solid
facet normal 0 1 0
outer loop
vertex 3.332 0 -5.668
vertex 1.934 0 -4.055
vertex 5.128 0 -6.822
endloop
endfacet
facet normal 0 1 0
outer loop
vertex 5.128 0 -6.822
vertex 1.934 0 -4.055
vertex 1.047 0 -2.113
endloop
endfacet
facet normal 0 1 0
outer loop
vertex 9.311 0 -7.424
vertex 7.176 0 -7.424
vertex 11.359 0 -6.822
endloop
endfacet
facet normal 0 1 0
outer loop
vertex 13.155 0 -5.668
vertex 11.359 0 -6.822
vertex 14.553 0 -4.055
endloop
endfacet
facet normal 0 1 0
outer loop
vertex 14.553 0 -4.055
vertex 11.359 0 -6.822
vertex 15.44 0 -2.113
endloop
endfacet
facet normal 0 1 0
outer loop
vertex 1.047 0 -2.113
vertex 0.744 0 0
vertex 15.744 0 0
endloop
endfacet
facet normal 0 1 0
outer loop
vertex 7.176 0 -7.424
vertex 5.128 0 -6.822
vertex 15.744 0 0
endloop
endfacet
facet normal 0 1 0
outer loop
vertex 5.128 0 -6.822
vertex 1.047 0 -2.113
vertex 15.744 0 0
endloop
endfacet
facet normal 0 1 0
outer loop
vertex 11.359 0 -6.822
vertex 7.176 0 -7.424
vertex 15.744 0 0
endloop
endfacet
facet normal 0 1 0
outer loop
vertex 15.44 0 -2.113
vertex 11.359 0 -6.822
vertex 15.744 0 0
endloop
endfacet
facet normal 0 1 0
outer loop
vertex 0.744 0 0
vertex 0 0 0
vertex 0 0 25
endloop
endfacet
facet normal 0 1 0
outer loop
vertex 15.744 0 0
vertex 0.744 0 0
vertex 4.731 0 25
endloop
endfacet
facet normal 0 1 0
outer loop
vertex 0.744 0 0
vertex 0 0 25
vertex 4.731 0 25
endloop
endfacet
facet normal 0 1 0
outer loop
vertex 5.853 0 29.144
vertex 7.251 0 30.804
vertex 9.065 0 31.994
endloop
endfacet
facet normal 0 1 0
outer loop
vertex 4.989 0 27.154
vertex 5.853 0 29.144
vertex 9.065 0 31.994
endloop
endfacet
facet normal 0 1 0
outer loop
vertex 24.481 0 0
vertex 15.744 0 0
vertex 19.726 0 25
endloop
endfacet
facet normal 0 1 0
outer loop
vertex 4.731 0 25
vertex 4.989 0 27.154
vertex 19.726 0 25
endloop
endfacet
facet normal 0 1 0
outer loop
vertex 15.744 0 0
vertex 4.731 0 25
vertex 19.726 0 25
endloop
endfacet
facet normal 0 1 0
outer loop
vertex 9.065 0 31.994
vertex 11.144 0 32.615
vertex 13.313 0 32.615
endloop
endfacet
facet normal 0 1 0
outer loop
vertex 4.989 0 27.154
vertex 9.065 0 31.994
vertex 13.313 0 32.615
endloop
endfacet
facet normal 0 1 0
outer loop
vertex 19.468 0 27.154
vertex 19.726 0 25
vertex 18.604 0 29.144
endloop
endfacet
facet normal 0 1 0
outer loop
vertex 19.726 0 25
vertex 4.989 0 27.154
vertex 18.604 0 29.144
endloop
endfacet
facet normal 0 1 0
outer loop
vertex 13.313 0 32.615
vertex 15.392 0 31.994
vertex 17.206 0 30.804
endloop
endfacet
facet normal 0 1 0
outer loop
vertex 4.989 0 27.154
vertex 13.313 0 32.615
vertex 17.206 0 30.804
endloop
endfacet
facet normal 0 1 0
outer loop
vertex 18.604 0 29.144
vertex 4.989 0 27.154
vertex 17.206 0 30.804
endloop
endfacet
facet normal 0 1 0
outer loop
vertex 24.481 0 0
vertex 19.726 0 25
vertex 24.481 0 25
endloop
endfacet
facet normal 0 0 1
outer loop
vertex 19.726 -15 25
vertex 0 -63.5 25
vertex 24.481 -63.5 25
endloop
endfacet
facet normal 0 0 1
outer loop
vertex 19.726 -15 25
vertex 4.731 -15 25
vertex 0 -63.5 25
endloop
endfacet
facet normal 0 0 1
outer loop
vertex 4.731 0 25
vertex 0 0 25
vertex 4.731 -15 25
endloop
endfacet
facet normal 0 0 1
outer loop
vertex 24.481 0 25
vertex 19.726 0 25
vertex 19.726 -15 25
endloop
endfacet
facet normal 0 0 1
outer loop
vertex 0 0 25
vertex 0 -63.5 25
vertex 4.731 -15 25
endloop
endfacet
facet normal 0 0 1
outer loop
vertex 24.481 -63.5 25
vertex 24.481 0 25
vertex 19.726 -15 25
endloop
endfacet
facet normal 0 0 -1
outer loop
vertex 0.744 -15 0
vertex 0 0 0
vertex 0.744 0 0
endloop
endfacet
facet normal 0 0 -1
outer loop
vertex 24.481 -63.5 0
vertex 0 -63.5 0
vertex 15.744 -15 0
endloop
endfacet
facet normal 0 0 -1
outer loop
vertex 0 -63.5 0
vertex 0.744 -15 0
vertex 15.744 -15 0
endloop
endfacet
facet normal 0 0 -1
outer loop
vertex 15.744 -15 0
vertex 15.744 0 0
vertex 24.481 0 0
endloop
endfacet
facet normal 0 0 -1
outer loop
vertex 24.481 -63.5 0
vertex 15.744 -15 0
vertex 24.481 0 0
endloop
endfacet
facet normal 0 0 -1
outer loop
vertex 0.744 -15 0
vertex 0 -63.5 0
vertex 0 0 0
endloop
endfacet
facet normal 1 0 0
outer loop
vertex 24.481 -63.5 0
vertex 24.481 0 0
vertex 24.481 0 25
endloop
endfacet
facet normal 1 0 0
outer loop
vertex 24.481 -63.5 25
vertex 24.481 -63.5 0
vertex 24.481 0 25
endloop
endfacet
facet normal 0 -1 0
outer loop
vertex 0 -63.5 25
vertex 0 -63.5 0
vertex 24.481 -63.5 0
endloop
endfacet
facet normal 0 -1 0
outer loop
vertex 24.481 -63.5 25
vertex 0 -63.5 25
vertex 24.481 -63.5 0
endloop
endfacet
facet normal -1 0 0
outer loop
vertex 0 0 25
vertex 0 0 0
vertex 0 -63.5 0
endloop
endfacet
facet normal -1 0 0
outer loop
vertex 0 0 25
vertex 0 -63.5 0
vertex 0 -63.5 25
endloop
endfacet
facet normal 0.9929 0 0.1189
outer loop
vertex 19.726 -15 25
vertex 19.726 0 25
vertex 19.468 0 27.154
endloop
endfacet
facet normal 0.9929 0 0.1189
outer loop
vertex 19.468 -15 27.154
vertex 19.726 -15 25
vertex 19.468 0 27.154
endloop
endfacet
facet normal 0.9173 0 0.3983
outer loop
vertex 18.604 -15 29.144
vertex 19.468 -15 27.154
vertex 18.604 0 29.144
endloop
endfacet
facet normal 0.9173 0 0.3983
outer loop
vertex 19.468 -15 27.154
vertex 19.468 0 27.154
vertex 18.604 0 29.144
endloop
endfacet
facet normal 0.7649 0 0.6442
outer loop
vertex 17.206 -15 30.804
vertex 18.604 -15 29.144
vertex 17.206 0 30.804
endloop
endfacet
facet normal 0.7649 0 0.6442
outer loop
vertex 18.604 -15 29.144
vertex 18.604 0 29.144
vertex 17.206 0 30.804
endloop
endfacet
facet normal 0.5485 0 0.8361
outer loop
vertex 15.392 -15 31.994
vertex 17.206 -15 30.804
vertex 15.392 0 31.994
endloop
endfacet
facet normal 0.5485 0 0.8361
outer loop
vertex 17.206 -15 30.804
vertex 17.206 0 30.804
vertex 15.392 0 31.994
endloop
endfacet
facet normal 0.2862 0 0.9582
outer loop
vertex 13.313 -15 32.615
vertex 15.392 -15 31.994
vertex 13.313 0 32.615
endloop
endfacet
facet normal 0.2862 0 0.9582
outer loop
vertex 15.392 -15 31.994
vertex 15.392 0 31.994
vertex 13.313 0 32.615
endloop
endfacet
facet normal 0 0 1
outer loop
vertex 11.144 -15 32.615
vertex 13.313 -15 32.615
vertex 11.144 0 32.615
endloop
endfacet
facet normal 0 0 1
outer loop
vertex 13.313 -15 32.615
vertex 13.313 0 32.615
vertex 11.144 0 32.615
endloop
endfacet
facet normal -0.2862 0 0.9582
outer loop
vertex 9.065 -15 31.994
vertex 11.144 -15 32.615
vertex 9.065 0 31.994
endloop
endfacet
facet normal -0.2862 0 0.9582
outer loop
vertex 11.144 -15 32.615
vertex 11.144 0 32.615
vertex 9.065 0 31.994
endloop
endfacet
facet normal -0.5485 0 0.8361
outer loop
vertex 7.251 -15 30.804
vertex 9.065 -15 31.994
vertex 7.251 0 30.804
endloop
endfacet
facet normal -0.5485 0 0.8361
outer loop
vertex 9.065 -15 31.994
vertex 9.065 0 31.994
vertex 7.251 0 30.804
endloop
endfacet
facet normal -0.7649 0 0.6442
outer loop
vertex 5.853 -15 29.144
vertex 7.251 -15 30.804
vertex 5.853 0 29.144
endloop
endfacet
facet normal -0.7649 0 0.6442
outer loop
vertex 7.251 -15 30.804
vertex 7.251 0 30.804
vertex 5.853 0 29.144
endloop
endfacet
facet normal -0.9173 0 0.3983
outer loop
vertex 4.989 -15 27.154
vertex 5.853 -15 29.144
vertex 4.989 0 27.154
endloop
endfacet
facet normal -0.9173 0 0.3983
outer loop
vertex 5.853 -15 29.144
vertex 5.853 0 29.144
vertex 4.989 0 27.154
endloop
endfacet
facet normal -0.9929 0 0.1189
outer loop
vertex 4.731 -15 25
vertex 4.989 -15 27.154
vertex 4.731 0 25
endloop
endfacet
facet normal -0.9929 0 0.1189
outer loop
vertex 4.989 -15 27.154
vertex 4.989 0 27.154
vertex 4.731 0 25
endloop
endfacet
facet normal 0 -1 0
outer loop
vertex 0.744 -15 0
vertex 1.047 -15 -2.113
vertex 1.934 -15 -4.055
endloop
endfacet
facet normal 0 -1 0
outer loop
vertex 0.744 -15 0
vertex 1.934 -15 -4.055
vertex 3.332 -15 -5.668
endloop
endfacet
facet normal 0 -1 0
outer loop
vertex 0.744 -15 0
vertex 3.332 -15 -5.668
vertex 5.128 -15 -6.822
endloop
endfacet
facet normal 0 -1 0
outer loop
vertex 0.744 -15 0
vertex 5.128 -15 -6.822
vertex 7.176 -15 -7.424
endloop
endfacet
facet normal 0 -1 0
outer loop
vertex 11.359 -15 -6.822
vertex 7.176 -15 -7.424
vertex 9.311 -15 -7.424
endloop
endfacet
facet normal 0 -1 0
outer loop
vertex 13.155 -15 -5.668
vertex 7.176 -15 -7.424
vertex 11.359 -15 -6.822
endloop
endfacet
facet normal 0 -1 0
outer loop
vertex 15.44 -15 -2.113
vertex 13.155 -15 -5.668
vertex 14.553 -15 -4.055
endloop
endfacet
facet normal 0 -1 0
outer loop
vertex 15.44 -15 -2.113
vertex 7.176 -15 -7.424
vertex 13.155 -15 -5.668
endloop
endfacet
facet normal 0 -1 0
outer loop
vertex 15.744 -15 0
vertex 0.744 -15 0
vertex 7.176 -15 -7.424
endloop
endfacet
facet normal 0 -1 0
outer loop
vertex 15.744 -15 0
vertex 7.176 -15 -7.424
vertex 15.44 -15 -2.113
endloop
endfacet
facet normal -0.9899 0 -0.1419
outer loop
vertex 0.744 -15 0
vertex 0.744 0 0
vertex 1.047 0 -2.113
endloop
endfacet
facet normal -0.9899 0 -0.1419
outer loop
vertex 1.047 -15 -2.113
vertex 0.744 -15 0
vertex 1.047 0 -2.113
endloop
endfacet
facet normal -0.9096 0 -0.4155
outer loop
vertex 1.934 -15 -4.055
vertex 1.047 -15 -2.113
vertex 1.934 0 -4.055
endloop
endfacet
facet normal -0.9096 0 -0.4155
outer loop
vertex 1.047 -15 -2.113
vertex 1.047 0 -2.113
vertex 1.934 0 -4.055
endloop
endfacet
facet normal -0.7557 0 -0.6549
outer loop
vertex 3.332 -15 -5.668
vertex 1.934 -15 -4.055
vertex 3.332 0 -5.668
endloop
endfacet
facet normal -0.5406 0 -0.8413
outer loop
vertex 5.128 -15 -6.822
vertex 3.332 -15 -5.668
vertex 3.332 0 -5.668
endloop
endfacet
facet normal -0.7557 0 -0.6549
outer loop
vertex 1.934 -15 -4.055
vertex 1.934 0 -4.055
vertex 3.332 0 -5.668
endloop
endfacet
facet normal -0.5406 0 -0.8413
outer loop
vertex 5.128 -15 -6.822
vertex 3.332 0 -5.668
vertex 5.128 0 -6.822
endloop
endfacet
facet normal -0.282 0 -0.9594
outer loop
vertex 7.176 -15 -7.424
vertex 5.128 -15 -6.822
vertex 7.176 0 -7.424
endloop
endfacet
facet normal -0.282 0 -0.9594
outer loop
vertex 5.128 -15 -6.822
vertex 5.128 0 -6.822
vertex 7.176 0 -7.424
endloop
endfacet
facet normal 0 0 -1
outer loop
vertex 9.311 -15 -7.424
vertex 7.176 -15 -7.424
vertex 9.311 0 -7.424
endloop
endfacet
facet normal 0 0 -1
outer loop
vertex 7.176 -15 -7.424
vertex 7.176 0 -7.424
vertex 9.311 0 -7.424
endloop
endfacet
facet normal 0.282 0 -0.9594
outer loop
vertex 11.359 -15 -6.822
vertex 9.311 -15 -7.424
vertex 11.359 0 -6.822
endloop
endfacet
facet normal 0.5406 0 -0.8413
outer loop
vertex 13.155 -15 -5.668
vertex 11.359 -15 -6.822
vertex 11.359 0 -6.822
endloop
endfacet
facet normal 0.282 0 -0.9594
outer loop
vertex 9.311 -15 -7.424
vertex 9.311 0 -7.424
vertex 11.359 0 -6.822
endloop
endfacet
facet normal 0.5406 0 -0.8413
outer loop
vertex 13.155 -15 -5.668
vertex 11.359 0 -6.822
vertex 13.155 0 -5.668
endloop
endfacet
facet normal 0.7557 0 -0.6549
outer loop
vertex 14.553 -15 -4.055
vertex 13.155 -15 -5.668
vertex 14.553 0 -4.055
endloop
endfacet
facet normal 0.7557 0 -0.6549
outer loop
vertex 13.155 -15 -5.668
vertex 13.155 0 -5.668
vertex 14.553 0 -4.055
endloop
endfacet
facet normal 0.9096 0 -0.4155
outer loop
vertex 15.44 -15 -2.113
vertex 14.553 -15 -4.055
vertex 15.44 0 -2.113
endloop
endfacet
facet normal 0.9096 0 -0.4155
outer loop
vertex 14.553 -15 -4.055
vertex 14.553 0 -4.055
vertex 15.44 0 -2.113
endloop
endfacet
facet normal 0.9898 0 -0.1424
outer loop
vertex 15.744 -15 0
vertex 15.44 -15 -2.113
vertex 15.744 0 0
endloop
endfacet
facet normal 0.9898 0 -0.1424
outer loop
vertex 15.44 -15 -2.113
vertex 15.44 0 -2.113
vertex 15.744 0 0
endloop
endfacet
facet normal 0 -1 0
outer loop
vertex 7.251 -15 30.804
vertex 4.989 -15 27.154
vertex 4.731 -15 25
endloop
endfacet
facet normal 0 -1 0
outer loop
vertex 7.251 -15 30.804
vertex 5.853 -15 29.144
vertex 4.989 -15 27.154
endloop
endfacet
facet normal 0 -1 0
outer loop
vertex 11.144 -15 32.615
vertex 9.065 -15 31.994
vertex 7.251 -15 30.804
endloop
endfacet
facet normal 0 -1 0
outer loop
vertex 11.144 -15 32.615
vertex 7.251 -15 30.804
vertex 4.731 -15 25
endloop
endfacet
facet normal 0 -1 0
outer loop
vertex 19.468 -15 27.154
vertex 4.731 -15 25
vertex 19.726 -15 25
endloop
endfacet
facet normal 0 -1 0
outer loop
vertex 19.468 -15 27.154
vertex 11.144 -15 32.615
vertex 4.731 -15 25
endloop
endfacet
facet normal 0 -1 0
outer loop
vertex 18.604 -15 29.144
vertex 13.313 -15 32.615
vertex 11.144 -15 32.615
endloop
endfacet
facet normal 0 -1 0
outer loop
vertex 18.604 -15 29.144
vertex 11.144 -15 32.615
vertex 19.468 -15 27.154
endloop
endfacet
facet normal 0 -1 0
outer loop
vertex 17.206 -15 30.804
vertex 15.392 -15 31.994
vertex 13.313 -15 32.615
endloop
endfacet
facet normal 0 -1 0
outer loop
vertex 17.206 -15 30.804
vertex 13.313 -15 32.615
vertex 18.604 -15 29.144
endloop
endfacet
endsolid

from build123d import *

# Parameters (mm, degrees)
F0_W     = 24.481318
F0_H     = 25
F1_DEPTH = 63.5
F2_R     = 7.5
F3_DEPTH = 15
F4_R     = 7.5
F5_DEPTH = 15


with BuildPart() as f1:
    # F0 (on Front) → F1 (new body)
    with BuildSketch(Plane.XZ):
        with Locations((12.240659, 12.5)):
            Rectangle(F0_W, F0_H)
    extrude(amount=F1_DEPTH)

    # F2 (on Front) → F3 (join)
    with BuildSketch(Plane.XZ):
        with Locations((12.228578, 25.193848)):
            Circle(F2_R)
    extrude(amount=F3_DEPTH)

    # F4 (on Front) → F5 (join)
    with BuildSketch(Plane.XZ):
        with Locations((8.243513, 0)):
            Circle(F4_R)
    extrude(amount=F5_DEPTH)


solid = f1.part
